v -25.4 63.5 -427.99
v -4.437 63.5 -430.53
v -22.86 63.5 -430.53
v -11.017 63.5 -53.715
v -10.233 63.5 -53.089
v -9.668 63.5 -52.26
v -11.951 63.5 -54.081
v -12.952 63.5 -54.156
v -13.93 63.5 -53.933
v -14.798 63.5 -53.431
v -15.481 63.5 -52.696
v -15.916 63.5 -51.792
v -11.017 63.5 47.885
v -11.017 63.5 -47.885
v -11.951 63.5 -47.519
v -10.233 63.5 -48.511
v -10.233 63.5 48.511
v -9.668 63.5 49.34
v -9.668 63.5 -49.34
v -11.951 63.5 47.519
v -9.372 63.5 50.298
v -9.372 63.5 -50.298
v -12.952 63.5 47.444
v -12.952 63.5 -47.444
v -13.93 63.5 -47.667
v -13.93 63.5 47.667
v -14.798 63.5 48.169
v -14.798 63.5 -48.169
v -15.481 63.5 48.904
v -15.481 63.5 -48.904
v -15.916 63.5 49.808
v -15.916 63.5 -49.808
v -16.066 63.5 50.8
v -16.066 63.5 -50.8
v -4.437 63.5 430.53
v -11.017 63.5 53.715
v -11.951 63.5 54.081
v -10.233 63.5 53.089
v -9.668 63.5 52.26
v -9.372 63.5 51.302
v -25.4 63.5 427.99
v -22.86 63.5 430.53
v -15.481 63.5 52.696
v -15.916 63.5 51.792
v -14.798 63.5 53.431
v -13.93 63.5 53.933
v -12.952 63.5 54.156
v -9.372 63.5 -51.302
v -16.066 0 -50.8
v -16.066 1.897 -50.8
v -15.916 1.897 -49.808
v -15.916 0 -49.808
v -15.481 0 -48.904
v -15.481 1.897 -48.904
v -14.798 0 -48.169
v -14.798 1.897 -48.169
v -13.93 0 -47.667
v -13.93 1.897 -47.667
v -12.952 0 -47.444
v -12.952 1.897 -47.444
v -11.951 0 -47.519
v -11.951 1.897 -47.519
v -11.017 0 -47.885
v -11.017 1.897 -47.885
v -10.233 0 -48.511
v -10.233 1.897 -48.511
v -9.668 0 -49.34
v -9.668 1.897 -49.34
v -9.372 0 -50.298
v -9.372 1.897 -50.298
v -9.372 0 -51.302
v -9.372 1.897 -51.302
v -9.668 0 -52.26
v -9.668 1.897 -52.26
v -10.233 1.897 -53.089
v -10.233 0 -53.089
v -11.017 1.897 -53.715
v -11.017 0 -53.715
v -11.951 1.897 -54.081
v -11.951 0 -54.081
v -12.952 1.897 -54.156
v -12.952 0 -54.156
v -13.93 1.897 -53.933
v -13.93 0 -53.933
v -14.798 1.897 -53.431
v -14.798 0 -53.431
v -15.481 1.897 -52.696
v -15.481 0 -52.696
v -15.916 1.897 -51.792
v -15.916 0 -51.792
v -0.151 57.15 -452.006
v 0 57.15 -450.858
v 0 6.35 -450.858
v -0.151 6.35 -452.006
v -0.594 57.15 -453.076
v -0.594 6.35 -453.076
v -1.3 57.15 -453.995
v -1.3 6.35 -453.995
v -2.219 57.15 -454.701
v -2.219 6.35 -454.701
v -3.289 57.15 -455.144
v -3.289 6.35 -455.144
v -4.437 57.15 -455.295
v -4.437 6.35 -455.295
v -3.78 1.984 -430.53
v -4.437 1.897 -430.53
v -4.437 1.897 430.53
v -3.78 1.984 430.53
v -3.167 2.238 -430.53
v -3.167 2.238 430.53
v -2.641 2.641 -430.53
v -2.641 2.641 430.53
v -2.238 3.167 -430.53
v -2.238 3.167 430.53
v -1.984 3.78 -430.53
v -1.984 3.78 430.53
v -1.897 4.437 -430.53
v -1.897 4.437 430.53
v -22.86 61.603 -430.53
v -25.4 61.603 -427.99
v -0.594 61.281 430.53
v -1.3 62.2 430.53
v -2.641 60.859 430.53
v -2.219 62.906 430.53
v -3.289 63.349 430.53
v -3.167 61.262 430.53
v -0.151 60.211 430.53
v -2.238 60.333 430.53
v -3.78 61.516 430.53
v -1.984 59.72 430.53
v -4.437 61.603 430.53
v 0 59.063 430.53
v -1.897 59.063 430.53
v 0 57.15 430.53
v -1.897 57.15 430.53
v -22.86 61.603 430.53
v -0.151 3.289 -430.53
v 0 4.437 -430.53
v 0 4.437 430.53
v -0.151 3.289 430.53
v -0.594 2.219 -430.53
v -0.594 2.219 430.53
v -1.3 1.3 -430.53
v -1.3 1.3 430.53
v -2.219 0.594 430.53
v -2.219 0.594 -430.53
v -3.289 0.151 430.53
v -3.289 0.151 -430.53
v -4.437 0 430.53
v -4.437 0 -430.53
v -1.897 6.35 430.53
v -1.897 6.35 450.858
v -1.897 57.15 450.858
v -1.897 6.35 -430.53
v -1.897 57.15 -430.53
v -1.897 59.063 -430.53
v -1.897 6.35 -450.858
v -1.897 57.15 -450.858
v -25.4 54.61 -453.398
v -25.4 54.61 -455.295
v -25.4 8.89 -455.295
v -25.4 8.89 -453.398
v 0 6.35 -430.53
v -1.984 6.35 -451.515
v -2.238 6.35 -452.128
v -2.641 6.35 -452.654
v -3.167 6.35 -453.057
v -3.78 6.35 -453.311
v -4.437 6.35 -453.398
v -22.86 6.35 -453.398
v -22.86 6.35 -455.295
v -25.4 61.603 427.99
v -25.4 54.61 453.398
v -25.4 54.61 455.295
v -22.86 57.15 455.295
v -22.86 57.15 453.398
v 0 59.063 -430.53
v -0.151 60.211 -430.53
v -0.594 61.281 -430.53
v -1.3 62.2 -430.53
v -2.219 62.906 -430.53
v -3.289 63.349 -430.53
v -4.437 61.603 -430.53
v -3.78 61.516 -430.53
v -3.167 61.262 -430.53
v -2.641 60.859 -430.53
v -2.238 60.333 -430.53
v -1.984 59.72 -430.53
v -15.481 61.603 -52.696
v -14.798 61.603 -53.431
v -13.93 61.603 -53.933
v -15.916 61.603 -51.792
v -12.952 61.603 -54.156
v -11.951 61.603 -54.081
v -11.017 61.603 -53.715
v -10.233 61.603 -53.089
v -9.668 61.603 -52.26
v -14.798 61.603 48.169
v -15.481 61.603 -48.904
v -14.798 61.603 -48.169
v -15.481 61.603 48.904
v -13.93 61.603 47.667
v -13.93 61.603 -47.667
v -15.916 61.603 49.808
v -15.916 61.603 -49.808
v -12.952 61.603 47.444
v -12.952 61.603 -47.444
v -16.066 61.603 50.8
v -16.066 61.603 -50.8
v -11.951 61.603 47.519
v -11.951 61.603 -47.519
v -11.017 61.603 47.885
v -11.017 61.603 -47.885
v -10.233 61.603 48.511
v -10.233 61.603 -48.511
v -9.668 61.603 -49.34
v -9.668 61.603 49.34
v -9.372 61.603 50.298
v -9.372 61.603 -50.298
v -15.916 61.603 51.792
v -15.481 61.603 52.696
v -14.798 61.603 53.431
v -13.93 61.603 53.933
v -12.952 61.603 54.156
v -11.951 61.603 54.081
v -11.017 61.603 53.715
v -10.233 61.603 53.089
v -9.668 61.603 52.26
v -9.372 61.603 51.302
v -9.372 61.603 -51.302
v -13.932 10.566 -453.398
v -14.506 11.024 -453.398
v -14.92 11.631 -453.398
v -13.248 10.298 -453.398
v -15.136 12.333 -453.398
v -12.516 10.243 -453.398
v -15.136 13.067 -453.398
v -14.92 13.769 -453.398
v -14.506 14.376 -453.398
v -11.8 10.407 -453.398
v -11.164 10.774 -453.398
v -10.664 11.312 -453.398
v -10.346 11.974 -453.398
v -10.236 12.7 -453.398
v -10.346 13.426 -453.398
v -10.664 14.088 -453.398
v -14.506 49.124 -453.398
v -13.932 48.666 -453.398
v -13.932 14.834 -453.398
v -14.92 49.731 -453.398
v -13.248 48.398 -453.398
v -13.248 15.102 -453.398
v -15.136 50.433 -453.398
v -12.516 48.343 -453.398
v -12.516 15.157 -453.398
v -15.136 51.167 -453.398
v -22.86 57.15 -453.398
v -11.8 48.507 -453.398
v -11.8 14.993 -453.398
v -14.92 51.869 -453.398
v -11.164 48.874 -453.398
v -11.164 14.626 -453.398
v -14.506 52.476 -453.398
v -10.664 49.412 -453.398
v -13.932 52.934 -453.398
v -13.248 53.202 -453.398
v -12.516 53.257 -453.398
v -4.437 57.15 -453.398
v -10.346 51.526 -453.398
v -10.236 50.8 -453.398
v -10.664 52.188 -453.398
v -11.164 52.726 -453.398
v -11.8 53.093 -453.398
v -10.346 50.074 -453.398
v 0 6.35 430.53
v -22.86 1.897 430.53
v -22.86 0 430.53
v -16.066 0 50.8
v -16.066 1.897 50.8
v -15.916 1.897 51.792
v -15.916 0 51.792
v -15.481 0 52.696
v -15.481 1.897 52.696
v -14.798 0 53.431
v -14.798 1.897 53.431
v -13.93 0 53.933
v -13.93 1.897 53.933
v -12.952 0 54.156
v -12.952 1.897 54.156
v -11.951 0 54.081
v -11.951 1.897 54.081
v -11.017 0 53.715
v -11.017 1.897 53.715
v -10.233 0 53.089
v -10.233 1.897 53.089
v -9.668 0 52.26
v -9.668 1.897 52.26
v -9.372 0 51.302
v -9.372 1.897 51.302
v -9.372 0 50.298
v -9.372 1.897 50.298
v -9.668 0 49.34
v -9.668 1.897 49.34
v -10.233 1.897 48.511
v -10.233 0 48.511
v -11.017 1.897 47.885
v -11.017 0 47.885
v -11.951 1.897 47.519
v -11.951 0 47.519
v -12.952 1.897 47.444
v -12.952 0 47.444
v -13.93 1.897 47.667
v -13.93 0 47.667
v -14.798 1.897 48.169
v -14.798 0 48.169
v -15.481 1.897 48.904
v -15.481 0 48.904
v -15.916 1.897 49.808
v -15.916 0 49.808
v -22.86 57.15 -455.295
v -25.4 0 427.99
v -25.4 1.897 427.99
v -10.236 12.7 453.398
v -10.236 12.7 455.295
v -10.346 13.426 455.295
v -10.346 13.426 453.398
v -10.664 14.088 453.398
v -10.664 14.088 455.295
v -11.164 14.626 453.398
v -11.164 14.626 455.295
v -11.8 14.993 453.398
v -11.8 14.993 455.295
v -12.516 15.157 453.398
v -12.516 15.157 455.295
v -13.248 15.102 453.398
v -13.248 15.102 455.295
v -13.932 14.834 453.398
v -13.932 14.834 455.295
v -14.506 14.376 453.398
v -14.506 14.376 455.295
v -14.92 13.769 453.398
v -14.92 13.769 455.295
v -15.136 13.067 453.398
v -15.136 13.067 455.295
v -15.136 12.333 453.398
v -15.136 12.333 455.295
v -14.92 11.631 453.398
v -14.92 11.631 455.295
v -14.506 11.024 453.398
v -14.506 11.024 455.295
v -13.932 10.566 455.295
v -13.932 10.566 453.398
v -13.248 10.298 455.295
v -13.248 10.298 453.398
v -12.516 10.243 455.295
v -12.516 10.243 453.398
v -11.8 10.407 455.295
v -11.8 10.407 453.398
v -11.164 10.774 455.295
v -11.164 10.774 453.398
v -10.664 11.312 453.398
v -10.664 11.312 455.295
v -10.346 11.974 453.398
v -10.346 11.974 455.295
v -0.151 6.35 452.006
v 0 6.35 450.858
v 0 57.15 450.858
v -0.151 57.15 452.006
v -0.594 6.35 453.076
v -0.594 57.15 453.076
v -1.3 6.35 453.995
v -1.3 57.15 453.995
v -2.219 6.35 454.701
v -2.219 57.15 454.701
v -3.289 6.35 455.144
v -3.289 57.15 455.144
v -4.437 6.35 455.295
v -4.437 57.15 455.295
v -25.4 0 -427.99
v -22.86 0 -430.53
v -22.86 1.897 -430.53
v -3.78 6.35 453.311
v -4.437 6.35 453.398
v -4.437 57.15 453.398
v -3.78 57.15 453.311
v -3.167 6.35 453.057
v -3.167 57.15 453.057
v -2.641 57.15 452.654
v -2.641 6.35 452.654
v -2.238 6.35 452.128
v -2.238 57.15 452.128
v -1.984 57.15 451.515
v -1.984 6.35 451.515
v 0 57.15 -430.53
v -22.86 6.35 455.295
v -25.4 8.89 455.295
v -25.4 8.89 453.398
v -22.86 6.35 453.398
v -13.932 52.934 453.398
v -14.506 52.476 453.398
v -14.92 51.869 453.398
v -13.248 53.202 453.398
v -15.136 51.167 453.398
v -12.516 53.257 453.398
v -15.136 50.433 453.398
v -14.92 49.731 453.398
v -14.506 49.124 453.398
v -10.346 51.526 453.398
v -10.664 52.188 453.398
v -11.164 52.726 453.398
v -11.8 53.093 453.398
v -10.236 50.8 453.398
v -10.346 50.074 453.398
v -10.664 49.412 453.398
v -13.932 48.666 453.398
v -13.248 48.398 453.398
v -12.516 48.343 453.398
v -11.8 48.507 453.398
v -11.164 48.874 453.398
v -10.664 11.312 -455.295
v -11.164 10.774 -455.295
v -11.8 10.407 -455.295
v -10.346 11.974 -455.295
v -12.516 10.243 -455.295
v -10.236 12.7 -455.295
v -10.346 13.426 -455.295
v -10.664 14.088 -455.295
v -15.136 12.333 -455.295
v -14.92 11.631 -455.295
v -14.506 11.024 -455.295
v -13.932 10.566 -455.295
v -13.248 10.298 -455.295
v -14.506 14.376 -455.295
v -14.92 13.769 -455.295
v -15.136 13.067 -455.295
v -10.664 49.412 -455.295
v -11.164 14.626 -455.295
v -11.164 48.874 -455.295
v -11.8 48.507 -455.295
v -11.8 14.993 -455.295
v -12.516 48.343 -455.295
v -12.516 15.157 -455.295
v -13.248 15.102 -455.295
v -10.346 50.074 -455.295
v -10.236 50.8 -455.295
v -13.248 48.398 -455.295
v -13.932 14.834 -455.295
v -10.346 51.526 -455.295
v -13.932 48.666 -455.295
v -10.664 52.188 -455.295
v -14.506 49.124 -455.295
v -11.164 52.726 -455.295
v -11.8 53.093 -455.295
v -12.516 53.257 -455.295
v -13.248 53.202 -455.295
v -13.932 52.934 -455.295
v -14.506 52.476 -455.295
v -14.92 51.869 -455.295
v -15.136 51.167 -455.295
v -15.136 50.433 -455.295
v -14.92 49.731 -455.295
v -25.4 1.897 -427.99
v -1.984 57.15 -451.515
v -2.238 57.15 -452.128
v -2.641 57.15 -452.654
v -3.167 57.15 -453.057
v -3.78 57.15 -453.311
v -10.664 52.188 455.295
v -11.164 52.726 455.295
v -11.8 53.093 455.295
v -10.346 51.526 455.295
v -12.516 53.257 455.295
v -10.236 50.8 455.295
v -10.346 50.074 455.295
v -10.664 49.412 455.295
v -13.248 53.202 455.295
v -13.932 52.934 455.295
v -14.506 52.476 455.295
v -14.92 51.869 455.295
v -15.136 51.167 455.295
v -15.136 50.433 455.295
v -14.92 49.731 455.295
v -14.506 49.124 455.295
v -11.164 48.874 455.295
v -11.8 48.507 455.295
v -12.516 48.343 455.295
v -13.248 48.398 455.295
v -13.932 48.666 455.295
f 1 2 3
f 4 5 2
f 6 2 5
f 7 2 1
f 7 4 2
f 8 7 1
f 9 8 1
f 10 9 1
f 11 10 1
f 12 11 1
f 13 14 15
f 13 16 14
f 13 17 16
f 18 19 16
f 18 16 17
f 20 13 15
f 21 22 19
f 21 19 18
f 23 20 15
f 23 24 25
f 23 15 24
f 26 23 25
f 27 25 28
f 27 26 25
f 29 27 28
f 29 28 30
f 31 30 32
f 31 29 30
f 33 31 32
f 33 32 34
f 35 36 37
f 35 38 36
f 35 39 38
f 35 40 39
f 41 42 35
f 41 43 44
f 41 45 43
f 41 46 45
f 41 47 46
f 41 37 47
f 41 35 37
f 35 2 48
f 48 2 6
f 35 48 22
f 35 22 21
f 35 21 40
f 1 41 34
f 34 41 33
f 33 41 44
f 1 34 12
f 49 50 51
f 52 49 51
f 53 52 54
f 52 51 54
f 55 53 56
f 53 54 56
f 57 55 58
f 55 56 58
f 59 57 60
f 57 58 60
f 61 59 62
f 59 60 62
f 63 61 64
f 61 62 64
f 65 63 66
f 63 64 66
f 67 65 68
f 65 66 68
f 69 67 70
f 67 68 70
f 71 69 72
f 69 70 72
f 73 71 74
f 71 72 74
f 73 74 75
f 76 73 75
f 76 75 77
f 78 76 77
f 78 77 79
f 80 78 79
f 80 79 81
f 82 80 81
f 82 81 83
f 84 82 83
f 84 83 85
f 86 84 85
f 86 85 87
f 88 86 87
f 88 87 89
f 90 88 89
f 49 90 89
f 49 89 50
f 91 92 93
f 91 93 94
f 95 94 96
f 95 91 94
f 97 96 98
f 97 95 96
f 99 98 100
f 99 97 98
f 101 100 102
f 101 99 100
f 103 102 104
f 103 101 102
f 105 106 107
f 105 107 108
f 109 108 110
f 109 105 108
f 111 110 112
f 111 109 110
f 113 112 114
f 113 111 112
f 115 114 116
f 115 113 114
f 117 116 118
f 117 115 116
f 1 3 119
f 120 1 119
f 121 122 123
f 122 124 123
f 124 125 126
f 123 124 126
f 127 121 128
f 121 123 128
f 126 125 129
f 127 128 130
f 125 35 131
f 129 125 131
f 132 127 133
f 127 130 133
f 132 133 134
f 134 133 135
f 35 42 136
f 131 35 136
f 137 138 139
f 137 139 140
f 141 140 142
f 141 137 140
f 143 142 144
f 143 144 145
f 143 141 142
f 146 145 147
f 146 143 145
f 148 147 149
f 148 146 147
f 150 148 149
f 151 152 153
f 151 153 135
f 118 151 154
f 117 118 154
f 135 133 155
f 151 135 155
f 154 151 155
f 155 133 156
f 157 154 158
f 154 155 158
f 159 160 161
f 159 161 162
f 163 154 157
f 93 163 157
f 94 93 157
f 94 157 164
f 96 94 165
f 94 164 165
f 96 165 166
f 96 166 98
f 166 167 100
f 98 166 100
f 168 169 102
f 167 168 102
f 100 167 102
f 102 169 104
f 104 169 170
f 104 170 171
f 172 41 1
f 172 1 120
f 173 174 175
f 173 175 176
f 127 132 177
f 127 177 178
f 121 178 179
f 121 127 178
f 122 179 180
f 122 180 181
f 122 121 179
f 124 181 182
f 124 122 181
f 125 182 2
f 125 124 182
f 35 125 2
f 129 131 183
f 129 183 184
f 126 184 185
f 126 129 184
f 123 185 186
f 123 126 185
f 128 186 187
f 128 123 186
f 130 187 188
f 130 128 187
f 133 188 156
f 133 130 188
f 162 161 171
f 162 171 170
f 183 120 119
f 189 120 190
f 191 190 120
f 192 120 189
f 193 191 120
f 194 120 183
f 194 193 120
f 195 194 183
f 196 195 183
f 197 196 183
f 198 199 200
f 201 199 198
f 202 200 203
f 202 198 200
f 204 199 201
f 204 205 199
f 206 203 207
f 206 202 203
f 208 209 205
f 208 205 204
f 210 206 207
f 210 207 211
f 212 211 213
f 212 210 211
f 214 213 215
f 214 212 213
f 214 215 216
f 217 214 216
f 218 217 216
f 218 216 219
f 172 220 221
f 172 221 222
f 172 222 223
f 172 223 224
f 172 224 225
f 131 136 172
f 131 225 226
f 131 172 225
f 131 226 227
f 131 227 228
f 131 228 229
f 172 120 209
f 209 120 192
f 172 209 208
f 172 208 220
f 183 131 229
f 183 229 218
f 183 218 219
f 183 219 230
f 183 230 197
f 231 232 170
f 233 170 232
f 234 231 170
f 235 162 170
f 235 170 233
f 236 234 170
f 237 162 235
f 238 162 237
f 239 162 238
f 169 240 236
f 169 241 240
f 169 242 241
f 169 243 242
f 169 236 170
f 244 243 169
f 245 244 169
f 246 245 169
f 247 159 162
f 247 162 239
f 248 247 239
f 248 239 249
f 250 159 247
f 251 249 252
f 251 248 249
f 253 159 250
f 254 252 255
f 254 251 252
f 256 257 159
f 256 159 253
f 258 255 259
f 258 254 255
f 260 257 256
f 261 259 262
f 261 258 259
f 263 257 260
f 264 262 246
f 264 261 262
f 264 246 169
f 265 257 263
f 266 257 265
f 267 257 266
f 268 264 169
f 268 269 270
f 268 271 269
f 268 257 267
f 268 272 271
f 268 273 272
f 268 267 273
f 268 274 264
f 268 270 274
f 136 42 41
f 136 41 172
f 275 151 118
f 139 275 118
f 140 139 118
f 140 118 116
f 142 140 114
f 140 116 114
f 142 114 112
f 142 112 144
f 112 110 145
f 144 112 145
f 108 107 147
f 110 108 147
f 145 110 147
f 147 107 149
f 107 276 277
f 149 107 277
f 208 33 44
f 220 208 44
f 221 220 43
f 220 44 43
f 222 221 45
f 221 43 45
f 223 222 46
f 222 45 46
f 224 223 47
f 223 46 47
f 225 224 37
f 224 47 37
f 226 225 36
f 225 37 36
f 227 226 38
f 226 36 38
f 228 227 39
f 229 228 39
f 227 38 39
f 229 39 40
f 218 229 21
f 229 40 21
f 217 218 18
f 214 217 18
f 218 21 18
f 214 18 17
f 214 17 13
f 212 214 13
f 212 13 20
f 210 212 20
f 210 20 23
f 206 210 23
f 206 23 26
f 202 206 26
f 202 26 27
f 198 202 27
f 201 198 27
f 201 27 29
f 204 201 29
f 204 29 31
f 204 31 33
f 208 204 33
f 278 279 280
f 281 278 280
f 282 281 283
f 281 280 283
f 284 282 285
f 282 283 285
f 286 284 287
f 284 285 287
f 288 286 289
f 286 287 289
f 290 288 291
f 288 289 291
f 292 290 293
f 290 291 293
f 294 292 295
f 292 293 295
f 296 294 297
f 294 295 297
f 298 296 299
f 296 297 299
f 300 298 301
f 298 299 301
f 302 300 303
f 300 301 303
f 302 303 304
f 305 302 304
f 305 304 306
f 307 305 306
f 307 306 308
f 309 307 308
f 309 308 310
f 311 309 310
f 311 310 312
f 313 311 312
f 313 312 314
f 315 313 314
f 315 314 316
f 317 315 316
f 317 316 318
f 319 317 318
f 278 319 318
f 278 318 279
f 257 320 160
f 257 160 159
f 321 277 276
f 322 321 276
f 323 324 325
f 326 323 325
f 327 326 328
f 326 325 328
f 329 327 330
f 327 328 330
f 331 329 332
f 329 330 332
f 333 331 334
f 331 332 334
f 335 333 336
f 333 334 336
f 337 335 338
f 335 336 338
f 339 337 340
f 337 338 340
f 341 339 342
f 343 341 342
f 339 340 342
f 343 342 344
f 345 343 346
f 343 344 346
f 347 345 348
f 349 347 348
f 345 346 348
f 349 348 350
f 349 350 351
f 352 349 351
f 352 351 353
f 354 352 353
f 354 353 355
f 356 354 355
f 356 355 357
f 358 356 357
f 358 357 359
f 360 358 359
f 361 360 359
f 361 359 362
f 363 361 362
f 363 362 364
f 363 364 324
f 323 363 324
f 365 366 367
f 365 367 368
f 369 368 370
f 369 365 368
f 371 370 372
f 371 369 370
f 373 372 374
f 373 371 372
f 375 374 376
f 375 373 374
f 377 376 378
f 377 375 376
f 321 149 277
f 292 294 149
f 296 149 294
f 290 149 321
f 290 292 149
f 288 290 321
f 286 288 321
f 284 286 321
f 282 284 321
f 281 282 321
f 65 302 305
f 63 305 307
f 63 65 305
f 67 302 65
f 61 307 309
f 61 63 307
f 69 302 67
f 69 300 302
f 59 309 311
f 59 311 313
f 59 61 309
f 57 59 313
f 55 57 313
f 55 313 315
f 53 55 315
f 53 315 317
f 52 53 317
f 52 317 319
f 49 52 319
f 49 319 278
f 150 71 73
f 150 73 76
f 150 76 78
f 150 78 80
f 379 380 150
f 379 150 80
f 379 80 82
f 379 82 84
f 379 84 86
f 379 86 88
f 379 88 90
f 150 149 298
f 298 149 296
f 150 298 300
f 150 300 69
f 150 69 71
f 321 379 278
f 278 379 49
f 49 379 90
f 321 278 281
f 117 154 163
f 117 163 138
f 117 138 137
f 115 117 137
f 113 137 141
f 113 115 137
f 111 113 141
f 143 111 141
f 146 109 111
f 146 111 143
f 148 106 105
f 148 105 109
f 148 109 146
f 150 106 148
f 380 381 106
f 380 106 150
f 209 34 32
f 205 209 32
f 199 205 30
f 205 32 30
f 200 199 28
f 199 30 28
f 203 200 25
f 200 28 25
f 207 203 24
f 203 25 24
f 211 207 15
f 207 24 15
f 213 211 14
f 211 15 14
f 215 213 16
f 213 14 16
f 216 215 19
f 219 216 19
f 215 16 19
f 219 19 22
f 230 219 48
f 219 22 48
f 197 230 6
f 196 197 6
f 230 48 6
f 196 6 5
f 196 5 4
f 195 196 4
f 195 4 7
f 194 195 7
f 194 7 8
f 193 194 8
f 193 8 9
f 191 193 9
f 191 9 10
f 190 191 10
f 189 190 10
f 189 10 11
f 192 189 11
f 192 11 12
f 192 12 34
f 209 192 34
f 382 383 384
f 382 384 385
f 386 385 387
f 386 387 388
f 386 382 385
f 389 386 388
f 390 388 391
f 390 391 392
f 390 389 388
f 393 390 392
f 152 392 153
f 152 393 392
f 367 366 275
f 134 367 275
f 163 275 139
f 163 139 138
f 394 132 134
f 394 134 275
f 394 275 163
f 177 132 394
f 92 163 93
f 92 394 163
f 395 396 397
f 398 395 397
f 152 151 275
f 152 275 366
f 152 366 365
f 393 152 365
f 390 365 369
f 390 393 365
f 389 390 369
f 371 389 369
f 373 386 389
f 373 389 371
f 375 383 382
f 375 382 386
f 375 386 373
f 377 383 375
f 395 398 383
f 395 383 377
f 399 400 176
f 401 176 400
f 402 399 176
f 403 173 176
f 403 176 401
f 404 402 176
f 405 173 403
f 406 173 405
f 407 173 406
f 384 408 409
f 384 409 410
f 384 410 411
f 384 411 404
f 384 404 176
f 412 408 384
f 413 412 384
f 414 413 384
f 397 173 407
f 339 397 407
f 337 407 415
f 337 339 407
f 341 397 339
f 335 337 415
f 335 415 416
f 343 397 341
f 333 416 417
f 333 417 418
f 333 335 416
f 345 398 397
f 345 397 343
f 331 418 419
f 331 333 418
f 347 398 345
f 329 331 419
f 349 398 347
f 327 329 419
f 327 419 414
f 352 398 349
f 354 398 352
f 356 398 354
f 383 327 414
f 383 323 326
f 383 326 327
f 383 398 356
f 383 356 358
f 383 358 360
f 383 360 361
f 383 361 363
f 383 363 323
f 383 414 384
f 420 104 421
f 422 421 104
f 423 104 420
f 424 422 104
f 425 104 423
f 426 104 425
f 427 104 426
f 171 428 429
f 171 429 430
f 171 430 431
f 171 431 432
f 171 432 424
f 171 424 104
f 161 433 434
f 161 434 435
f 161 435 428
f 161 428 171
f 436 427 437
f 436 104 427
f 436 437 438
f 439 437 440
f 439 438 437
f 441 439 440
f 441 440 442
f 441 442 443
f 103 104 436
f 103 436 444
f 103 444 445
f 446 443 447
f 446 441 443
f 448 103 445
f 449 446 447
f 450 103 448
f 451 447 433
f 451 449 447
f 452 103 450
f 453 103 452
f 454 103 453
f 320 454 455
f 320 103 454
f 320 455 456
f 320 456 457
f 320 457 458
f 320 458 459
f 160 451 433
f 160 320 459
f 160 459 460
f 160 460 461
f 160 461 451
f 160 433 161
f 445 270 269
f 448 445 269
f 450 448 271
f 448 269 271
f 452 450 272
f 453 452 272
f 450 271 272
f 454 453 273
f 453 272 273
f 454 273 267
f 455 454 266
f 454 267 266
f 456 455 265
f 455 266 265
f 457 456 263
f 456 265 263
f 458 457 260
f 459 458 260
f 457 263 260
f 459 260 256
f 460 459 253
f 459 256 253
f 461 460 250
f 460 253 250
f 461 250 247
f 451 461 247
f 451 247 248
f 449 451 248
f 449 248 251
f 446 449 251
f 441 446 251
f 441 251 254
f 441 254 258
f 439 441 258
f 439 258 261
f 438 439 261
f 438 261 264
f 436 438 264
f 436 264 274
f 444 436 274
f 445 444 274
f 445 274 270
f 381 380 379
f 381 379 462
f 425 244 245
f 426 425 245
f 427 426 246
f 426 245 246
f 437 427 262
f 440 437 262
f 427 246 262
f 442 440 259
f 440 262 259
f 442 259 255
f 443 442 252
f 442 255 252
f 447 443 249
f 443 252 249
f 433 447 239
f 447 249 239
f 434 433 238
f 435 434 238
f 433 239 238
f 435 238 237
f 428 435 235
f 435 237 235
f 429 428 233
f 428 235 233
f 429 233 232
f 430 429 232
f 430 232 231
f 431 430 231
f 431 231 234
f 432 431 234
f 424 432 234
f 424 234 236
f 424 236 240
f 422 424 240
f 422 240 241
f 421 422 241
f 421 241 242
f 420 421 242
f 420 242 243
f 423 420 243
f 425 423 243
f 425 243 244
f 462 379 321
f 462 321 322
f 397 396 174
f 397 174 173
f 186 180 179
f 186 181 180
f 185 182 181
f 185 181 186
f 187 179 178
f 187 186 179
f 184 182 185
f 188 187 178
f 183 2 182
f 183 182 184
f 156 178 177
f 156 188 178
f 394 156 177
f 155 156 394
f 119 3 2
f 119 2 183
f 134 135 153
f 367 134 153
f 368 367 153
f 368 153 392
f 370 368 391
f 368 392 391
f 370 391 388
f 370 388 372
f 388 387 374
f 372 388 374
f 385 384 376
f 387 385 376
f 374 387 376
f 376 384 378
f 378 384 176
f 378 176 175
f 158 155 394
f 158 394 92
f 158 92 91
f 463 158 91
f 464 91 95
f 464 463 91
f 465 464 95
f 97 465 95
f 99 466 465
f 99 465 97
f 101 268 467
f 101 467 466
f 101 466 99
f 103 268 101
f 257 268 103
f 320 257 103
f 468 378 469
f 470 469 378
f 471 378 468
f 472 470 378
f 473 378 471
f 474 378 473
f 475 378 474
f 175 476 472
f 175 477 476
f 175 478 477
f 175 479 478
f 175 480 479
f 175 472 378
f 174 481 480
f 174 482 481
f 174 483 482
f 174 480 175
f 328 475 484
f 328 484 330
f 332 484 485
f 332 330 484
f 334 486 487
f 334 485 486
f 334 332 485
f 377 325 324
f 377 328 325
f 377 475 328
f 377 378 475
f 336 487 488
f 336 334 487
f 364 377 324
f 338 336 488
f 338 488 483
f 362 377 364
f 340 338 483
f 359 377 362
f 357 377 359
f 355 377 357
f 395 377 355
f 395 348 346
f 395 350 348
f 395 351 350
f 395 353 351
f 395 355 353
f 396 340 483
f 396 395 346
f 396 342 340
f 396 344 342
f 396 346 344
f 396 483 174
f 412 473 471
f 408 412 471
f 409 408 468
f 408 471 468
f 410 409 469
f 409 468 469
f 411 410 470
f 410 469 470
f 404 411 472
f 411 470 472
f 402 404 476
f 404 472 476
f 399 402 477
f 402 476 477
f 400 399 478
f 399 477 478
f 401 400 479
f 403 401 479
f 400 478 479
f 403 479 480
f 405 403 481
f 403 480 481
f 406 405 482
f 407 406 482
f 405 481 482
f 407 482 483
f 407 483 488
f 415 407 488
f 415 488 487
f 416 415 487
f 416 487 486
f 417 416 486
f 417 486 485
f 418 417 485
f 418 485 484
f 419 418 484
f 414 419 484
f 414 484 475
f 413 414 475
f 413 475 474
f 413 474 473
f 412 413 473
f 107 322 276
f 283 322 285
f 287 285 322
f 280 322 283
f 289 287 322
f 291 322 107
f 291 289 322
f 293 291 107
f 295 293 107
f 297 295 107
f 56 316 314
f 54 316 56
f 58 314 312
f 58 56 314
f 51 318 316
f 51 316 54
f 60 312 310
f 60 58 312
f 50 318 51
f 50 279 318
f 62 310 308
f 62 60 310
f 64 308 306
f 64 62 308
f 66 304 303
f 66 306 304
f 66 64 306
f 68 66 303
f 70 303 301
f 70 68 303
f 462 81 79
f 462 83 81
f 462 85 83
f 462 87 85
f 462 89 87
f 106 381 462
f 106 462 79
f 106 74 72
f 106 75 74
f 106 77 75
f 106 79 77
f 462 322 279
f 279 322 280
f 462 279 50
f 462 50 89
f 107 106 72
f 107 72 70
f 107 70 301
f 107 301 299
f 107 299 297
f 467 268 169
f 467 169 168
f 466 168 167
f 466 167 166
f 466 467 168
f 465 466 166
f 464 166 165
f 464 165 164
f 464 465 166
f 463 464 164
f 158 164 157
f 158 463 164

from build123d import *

# Parameters (mm, degrees)
SKETCH1_W                      = 861.06
SKETCH1_H                      = 63.5
BASE_FLANGE1_DEPTH             = 1.89738
EDGE_FLANGE1_STRIP_W           = 12.66952
EDGE_FLANGE1_STRIP_H           = 1.89738
EDGE_FLANGE1_STRIP_CUT_DEPTH   = 861.06
EDGE_FLANGE1_STRIP_2_W         = 12.66952
EDGE_FLANGE1_STRIP_2_H         = 1.89738
EDGE_FLANGE1_STRIP_CUT_2_DEPTH = 861.06
EDGE_FLANGE1_DEPTH             = 861.06
EDGE_FLANGE1_BEND_DEPTH        = 861.06
SKETCH12_W                     = 24.765
SKETCH12_H                     = 50.8
BOSS_EXTRUDE1_DEPTH            = 1.89738
SKETCH13_R                     = 3.3655
CUT_EXTRUDE1_DEPTH             = 461.403026733
EDGE_FLANGE2_STRIP_W           = 12.66952
EDGE_FLANGE2_STRIP_H           = 1.89738
EDGE_FLANGE2_STRIP_CUT_DEPTH   = 50.8
EDGE_FLANGE2_STRIP_2_W         = 12.66952
EDGE_FLANGE2_STRIP_2_H         = 1.89738
EDGE_FLANGE2_STRIP_CUT_2_DEPTH = 50.8
EDGE_FLANGE2_DEPTH             = 50.8
EDGE_FLANGE2_BEND_DEPTH        = 50.8
SKETCH20_R                     = 2.4638
CUT_EXTRUDE2_DEPTH             = 914.154728455
CHAMFER1_SIZE                  = 2.54


# Sheet-metal steps are written as plain solids
with BuildPart() as part:
    # Sketch1 → Base-Flange1 (new body)
    with BuildSketch(Plane(origin=(0, 0, 0), x_dir=(0, 0, -1), z_dir=(1, 0, 0))):
        with Locations((0, 31.75)):
            Rectangle(SKETCH1_W, SKETCH1_H)
    extrude(amount=-BASE_FLANGE1_DEPTH)

    # Edge-Flange1 strip (across the edge) → Edge-Flange1 strip cut (cut)
    with BuildSketch(Plane(origin=(-1.89738, 63.5, 430.53), x_dir=(0, -1, 0), z_dir=(0, 0, -1))):
        with Locations((-1.89738, -0.94869)):
            Rectangle(EDGE_FLANGE1_STRIP_W, EDGE_FLANGE1_STRIP_H)
    extrude(amount=EDGE_FLANGE1_STRIP_CUT_DEPTH, mode=Mode.SUBTRACT)

    # Edge-Flange1 strip 2 (across the edge) → Edge-Flange1 strip cut 2 (cut)
    with BuildSketch(Plane(origin=(-1.89738, 0, -430.53), x_dir=(0, 1, 0), z_dir=(0, 0, 1))):
        with Locations((-1.89738, -0.94869)):
            Rectangle(EDGE_FLANGE1_STRIP_2_W, EDGE_FLANGE1_STRIP_2_H)
    extrude(amount=EDGE_FLANGE1_STRIP_CUT_2_DEPTH, mode=Mode.SUBTRACT)

    # Edge-Flange1 section (across the edge) → Edge-Flange1 (add)
    with BuildSketch(Plane(origin=(-1.89738, 63.5, 430.53), x_dir=(0, -1, 0), z_dir=(0, 0, -1))):
        with BuildLine():
            Line((0, 2.54), (0, 23.50262))
            Line((0, 23.50262), (1.89738, 23.50262))
            Line((1.89738, 23.50262), (1.89738, 2.54))
            ThreePointArc((1.89738, 2.54), (2.641328776, 0.743948776), (4.43738, 0))
            Line((4.43738, 0), (4.43738, -1.89738))
            ThreePointArc((4.43738, -1.89738), (1.299678511, -0.597701489), (0, 2.54))
        make_face()
    extrude(amount=EDGE_FLANGE1_DEPTH)

    # Edge-Flange1 section 2 (across the edge) → Edge-Flange1 bend (add)
    with BuildSketch(Plane(origin=(-1.89738, 0, -430.53), x_dir=(0, 1, 0), z_dir=(0, 0, 1))):
        with BuildLine():
            Line((0, 2.54), (0, 23.50262))
            Line((0, 23.50262), (1.89738, 23.50262))
            Line((1.89738, 23.50262), (1.89738, 2.54))
            ThreePointArc((1.89738, 2.54), (2.641328776, 0.743948776), (4.43738, 0))
            Line((4.43738, 0), (4.43738, -1.89738))
            ThreePointArc((4.43738, -1.89738), (1.299678511, -0.597701489), (0, 2.54))
        make_face()
    extrude(amount=EDGE_FLANGE1_BEND_DEPTH)

    # Sketch12 → Boss-Extrude1 (add)
    with BuildSketch(Plane(origin=(0, 0, 0), x_dir=(0, 0, -1), z_dir=(1, 0, 0))):
        with Locations((-442.9125, 31.75)):
            Rectangle(SKETCH12_W, SKETCH12_H)
    boss_extrude1 = extrude(amount=-BOSS_EXTRUDE1_DEPTH)

    # Mirror1: Boss-Extrude1 across plane
    add(boss_extrude1.mirror(Plane.XY))

    # Sketch13 → Cut-Extrude1 (cut, through all)
    with BuildSketch(Plane(origin=(0, 63.5, 0), x_dir=(1, 0, 0), z_dir=(0, 1, 0))):
        with Locations(Location((-12.7, 50.8, 0), (0, 0, 180))):
            Circle(SKETCH13_R)
        with Locations(Location((-12.7, -50.8, 0), (0, 0, 180))):
            Circle(SKETCH13_R)
    extrude(amount=-CUT_EXTRUDE1_DEPTH, mode=Mode.SUBTRACT)

    # Edge-Flange2 strip (across the edge) → Edge-Flange2 strip cut (cut)
    with BuildSketch(Plane(origin=(-1.89738, 6.35, 455.295), x_dir=(0, 0, -1), z_dir=(0, 1, 0))):
        with Locations((-1.89738, -0.94869)):
            Rectangle(EDGE_FLANGE2_STRIP_W, EDGE_FLANGE2_STRIP_H)
    extrude(amount=EDGE_FLANGE2_STRIP_CUT_DEPTH, mode=Mode.SUBTRACT)

    # Edge-Flange2 strip 2 (across the edge) → Edge-Flange2 strip cut 2 (cut)
    with BuildSketch(Plane(origin=(-1.89738, 57.15, -455.295), x_dir=(0, 0, 1), z_dir=(0, -1, 0))):
        with Locations((-1.89738, -0.94869)):
            Rectangle(EDGE_FLANGE2_STRIP_2_W, EDGE_FLANGE2_STRIP_2_H)
    extrude(amount=EDGE_FLANGE2_STRIP_CUT_2_DEPTH, mode=Mode.SUBTRACT)

    # Edge-Flange2 section (across the edge) → Edge-Flange2 (add)
    with BuildSketch(Plane(origin=(-1.89738, 6.35, 455.295), x_dir=(0, 0, -1), z_dir=(0, 1, 0))):
        with BuildLine():
            Line((0, 2.54), (0, 23.50262))
            Line((0, 23.50262), (1.89738, 23.50262))
            Line((1.89738, 23.50262), (1.89738, 2.54))
            ThreePointArc((1.89738, 2.54), (2.641328776, 0.743948776), (4.43738, 0))
            Line((4.43738, 0), (4.43738, -1.89738))
            ThreePointArc((4.43738, -1.89738), (1.299678511, -0.597701489), (0, 2.54))
        make_face()
    extrude(amount=EDGE_FLANGE2_DEPTH)

    # Edge-Flange2 section 2 (across the edge) → Edge-Flange2 bend (add)
    with BuildSketch(Plane(origin=(-1.89738, 57.15, -455.295), x_dir=(0, 0, 1), z_dir=(0, -1, 0))):
        with BuildLine():
            Line((0, 2.54), (0, 23.50262))
            Line((0, 23.50262), (1.89738, 23.50262))
            Line((1.89738, 23.50262), (1.89738, 2.54))
            ThreePointArc((1.89738, 2.54), (2.641328776, 0.743948776), (4.43738, 0))
            Line((4.43738, 0), (4.43738, -1.89738))
            ThreePointArc((4.43738, -1.89738), (1.299678511, -0.597701489), (0, 2.54))
        make_face()
    extrude(amount=EDGE_FLANGE2_BEND_DEPTH)

    # Sketch20 → Cut-Extrude2 (cut, through all)
    with BuildSketch(Plane.XY.offset(455.295)):
        with Locations((-12.7, 50.8)):
            Circle(SKETCH20_R)
        with Locations((-12.7, 12.7)):
            Circle(SKETCH20_R)
    extrude(amount=-CUT_EXTRUDE2_DEPTH, mode=Mode.SUBTRACT)

    # Chamfer1
    chamfer1_edges = [part.edges().sort_by_distance(p)[0] for p in [
        (-25.4, 6.35, 454.34631),
        (-25.4, 57.15, 454.34631),
        (-25.4, 57.15, -454.34631),
        (-25.4, 6.35, -454.34631),
        (-25.4, 62.55131, 430.53),
        (-25.4, 62.55131, -430.53),
        (-25.4, 0.94869, -430.53),
        (-25.4, 0.94869, 430.53),
    ]]
    chamfer(chamfer1_edges, length=CHAMFER1_SIZE)


solid = part.part
